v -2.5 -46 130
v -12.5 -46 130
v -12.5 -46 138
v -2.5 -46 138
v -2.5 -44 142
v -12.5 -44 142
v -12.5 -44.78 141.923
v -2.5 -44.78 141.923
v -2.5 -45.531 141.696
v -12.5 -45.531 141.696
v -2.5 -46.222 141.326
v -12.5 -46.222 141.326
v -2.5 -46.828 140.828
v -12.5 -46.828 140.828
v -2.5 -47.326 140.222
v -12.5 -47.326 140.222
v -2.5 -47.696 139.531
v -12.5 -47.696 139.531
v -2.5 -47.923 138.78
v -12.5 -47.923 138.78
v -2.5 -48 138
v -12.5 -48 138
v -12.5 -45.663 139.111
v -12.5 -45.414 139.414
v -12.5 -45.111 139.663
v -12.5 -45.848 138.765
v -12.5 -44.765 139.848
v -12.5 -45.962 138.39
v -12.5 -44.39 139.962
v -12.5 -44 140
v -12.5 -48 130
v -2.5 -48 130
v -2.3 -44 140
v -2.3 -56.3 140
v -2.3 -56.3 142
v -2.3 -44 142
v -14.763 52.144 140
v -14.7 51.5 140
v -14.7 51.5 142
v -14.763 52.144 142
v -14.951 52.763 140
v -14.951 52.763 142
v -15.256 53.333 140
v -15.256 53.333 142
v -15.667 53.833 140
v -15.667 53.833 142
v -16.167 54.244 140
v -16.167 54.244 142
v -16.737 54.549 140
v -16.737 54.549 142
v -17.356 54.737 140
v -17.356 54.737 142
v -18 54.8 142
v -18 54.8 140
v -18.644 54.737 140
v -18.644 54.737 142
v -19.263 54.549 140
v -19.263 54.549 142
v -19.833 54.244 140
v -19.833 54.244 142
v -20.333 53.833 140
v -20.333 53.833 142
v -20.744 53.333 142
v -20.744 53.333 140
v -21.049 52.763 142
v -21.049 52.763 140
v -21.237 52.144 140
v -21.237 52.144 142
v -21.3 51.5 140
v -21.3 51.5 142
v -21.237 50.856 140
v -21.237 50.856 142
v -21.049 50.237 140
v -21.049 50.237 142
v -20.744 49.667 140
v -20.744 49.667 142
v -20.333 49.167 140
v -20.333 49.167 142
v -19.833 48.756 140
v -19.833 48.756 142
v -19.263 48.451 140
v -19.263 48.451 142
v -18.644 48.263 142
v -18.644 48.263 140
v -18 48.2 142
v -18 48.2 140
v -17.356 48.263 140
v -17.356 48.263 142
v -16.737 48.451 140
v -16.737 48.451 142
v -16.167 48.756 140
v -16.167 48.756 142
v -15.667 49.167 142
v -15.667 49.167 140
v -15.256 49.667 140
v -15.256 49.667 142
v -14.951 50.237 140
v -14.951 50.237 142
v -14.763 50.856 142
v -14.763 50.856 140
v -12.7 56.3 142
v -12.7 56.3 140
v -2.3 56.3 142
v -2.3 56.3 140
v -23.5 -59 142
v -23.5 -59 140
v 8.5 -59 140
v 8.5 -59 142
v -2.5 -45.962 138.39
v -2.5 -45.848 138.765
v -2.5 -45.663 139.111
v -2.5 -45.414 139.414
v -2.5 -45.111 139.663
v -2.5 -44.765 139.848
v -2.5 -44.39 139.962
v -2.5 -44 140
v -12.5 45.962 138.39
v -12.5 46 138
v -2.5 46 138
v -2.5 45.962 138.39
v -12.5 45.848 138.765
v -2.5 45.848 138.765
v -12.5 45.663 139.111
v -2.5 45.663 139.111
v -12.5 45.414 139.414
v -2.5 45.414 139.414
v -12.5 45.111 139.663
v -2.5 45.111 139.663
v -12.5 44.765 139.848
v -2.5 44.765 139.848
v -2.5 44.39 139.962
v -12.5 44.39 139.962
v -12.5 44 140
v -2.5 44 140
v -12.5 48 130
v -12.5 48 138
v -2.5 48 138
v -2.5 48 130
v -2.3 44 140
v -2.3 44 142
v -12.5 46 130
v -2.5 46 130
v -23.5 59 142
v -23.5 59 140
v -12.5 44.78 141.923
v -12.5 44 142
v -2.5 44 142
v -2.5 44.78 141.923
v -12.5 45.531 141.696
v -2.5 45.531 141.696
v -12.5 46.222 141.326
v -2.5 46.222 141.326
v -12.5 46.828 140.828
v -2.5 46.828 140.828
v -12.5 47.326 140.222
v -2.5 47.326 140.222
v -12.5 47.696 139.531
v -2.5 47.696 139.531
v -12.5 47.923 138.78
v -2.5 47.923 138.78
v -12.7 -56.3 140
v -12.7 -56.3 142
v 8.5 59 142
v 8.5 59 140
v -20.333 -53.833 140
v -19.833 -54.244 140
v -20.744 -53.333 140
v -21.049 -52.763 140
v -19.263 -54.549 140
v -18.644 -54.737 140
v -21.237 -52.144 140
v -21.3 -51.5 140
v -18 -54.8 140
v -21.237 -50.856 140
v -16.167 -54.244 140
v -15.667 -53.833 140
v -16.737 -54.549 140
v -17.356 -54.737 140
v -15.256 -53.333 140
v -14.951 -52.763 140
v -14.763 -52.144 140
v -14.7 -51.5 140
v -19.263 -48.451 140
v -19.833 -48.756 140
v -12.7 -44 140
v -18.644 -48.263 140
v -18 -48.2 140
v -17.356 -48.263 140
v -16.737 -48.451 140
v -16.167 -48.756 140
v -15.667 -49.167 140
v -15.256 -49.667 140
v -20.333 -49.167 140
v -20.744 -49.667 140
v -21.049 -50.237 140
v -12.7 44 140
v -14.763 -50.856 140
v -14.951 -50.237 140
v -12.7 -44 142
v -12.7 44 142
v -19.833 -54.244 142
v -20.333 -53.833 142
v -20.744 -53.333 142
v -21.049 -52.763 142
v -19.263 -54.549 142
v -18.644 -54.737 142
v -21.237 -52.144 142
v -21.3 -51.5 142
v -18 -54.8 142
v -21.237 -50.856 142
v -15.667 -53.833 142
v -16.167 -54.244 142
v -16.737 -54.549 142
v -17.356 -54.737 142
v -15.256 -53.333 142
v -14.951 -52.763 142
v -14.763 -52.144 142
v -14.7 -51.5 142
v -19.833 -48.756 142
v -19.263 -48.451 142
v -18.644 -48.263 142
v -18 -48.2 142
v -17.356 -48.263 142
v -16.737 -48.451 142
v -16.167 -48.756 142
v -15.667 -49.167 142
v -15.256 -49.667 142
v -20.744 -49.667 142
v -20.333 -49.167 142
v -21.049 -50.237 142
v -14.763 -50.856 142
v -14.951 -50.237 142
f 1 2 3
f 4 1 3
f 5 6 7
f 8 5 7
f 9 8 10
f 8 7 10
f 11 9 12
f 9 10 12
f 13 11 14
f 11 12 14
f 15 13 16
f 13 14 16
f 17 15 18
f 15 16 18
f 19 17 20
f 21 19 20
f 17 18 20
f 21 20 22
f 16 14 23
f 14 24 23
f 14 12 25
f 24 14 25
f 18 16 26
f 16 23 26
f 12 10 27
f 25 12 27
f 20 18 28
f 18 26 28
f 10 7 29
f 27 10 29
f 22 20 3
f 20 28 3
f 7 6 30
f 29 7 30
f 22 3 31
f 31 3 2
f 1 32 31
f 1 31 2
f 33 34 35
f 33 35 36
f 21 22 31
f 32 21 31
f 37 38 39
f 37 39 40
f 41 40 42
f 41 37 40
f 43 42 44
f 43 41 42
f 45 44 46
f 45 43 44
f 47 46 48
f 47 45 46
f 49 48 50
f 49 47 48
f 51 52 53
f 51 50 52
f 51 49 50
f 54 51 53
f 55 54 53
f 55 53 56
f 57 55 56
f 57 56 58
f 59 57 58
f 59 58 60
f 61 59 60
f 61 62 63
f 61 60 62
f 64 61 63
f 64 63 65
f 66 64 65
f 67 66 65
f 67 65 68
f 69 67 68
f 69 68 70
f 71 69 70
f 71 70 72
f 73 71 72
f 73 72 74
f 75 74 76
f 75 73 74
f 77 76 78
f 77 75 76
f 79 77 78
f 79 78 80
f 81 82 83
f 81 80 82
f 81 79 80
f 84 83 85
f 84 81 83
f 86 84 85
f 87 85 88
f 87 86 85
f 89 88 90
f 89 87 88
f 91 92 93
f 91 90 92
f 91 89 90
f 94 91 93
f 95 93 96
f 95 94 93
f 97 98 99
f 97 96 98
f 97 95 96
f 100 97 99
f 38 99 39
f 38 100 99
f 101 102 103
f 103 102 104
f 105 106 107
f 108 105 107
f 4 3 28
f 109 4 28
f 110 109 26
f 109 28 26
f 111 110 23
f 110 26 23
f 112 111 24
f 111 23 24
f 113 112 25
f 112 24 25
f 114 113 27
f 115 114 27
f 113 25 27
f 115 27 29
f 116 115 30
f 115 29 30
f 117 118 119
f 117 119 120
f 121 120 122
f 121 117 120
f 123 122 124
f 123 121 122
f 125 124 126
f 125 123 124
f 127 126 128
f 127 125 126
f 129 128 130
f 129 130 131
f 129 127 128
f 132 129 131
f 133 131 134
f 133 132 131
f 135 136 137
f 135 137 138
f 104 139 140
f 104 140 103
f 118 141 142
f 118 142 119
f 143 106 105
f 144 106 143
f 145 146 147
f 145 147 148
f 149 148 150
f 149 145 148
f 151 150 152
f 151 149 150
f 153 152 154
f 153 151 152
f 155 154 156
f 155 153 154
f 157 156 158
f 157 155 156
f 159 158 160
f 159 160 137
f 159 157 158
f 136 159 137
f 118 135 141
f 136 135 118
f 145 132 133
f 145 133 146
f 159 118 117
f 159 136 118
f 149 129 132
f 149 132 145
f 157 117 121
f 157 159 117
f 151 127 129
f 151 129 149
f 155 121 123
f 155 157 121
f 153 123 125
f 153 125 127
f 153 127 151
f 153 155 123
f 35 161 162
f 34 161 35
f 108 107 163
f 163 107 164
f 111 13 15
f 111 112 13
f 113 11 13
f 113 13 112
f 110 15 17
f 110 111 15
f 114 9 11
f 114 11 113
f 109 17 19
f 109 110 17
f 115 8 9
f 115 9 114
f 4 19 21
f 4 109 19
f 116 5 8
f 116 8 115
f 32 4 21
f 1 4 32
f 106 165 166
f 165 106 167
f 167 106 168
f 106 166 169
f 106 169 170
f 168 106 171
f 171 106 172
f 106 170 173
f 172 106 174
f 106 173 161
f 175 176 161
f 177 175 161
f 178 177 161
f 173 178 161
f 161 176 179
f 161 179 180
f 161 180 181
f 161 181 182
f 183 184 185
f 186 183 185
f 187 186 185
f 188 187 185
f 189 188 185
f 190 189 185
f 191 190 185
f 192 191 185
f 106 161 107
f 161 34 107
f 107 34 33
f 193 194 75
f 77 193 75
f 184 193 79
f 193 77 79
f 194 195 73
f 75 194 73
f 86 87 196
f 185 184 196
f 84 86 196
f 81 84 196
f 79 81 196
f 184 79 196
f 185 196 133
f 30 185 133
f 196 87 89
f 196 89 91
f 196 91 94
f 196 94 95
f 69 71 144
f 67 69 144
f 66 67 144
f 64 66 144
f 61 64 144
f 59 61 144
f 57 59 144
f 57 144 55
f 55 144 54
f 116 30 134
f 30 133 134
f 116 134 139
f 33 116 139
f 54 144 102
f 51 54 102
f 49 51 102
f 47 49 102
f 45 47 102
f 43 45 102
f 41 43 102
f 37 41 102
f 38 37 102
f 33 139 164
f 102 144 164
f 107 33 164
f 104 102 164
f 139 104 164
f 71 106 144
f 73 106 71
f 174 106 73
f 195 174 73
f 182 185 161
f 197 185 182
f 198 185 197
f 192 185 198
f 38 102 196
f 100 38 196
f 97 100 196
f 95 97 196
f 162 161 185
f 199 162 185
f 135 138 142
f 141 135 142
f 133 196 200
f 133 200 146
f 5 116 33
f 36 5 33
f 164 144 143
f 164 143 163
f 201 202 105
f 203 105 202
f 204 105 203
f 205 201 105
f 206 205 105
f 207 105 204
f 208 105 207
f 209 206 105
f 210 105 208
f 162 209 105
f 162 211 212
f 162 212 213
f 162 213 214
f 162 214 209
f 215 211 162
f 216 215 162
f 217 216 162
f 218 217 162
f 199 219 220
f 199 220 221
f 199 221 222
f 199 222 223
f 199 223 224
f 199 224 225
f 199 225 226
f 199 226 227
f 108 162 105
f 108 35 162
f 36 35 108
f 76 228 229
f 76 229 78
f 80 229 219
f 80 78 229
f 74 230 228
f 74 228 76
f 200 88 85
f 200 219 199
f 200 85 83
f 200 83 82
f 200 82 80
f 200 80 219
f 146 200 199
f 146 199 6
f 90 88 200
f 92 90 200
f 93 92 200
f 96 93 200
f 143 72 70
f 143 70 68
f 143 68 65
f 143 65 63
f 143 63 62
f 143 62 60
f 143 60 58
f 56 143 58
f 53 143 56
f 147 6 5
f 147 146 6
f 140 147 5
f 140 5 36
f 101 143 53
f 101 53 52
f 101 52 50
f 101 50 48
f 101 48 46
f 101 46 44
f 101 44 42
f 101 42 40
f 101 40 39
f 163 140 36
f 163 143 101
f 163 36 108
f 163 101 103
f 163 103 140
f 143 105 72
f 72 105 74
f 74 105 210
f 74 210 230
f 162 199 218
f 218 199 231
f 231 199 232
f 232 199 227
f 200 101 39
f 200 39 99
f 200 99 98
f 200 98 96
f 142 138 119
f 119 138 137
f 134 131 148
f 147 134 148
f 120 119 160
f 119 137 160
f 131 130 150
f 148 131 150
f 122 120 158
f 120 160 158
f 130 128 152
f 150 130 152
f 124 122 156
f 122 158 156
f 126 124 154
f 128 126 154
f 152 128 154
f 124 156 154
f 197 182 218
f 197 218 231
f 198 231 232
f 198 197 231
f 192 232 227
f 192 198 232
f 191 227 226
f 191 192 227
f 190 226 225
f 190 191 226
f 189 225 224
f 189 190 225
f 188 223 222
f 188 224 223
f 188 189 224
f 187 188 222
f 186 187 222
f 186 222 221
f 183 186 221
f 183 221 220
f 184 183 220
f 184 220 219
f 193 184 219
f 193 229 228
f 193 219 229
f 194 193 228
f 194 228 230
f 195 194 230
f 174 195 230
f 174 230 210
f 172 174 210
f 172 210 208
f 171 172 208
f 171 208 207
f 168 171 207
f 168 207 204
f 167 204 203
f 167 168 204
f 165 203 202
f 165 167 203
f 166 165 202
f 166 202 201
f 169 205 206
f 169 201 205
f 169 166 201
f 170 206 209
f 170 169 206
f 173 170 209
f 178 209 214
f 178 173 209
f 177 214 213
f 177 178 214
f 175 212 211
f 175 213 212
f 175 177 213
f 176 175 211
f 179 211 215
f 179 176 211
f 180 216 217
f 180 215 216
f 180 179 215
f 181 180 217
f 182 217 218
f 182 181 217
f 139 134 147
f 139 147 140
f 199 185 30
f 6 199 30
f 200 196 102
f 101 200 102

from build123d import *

# Parameters (mm, degrees)
CLAMP_BAR_SKETCH_W       = 32
CLAMP_BAR_SKETCH_H       = 118
CLAMP_BAR_DEPTH          = 2
FINGER_RELIEF_SKETCH_W   = 10.4
FINGER_RELIEF_SKETCH_H   = 12.3
FINGER_RELIEFS_DEPTH     = 2.4
FOLDED_FINGERS_DEPTH     = 10
STUD_CLEARANCES_SKETCH_R = 3.3
STUD_CLEARANCES_DEPTH    = 2.4


with BuildPart() as part:
    # Clamp Bar Sketch → Clamp Bar (new body)
    with BuildSketch(Plane.XY.offset(140)):
        with Locations((-7.5, 0)):
            Rectangle(CLAMP_BAR_SKETCH_W, CLAMP_BAR_SKETCH_H)
    extrude(amount=CLAMP_BAR_DEPTH)

    # Finger Relief Sketch → Finger Reliefs (cut)
    with BuildSketch(Plane.XY.offset(139.8)):
        with Locations((-7.5, -50.15)):
            Rectangle(FINGER_RELIEF_SKETCH_W, FINGER_RELIEF_SKETCH_H)
        with Locations((-7.5, 50.15)):
            Rectangle(FINGER_RELIEF_SKETCH_W, FINGER_RELIEF_SKETCH_H)
    extrude(amount=FINGER_RELIEFS_DEPTH, mode=Mode.SUBTRACT)

    # Folded Finger Sketch → Folded Fingers (add)
    with BuildSketch(Plane(origin=(-12.5, 0, 0), x_dir=(0, 0, -1), z_dir=(1, 0, 0))):
        with BuildLine():
            Line((-138, -48), (-130, -48))
            Line((-130, -48), (-130, -46))
            Line((-130, -46), (-138, -46))
            ThreePointArc((-138, -46), (-139.414213562, -45.414213562), (-140, -44))
            Line((-140, -44), (-142, -44))
            ThreePointArc((-142, -44), (-140.828427125, -46.828427125), (-138, -48))
        make_face()
        with BuildLine():
            Line((-138, 48), (-130, 48))
            Line((-130, 48), (-130, 46))
            Line((-130, 46), (-138, 46))
            ThreePointArc((-138, 46), (-139.414213562, 45.414213562), (-140, 44))
            Line((-140, 44), (-142, 44))
            ThreePointArc((-142, 44), (-140.828427125, 46.828427125), (-138, 48))
        make_face()
    extrude(amount=FOLDED_FINGERS_DEPTH)

    # Stud Clearances Sketch → Stud Clearances (cut)
    with BuildSketch(Plane.XY.offset(139.8)):
        with Locations((-18, -51.5)):
            Circle(STUD_CLEARANCES_SKETCH_R)
        with Locations((-18, 51.5)):
            Circle(STUD_CLEARANCES_SKETCH_R)
    extrude(amount=STUD_CLEARANCES_DEPTH, mode=Mode.SUBTRACT)


solid = part.part
